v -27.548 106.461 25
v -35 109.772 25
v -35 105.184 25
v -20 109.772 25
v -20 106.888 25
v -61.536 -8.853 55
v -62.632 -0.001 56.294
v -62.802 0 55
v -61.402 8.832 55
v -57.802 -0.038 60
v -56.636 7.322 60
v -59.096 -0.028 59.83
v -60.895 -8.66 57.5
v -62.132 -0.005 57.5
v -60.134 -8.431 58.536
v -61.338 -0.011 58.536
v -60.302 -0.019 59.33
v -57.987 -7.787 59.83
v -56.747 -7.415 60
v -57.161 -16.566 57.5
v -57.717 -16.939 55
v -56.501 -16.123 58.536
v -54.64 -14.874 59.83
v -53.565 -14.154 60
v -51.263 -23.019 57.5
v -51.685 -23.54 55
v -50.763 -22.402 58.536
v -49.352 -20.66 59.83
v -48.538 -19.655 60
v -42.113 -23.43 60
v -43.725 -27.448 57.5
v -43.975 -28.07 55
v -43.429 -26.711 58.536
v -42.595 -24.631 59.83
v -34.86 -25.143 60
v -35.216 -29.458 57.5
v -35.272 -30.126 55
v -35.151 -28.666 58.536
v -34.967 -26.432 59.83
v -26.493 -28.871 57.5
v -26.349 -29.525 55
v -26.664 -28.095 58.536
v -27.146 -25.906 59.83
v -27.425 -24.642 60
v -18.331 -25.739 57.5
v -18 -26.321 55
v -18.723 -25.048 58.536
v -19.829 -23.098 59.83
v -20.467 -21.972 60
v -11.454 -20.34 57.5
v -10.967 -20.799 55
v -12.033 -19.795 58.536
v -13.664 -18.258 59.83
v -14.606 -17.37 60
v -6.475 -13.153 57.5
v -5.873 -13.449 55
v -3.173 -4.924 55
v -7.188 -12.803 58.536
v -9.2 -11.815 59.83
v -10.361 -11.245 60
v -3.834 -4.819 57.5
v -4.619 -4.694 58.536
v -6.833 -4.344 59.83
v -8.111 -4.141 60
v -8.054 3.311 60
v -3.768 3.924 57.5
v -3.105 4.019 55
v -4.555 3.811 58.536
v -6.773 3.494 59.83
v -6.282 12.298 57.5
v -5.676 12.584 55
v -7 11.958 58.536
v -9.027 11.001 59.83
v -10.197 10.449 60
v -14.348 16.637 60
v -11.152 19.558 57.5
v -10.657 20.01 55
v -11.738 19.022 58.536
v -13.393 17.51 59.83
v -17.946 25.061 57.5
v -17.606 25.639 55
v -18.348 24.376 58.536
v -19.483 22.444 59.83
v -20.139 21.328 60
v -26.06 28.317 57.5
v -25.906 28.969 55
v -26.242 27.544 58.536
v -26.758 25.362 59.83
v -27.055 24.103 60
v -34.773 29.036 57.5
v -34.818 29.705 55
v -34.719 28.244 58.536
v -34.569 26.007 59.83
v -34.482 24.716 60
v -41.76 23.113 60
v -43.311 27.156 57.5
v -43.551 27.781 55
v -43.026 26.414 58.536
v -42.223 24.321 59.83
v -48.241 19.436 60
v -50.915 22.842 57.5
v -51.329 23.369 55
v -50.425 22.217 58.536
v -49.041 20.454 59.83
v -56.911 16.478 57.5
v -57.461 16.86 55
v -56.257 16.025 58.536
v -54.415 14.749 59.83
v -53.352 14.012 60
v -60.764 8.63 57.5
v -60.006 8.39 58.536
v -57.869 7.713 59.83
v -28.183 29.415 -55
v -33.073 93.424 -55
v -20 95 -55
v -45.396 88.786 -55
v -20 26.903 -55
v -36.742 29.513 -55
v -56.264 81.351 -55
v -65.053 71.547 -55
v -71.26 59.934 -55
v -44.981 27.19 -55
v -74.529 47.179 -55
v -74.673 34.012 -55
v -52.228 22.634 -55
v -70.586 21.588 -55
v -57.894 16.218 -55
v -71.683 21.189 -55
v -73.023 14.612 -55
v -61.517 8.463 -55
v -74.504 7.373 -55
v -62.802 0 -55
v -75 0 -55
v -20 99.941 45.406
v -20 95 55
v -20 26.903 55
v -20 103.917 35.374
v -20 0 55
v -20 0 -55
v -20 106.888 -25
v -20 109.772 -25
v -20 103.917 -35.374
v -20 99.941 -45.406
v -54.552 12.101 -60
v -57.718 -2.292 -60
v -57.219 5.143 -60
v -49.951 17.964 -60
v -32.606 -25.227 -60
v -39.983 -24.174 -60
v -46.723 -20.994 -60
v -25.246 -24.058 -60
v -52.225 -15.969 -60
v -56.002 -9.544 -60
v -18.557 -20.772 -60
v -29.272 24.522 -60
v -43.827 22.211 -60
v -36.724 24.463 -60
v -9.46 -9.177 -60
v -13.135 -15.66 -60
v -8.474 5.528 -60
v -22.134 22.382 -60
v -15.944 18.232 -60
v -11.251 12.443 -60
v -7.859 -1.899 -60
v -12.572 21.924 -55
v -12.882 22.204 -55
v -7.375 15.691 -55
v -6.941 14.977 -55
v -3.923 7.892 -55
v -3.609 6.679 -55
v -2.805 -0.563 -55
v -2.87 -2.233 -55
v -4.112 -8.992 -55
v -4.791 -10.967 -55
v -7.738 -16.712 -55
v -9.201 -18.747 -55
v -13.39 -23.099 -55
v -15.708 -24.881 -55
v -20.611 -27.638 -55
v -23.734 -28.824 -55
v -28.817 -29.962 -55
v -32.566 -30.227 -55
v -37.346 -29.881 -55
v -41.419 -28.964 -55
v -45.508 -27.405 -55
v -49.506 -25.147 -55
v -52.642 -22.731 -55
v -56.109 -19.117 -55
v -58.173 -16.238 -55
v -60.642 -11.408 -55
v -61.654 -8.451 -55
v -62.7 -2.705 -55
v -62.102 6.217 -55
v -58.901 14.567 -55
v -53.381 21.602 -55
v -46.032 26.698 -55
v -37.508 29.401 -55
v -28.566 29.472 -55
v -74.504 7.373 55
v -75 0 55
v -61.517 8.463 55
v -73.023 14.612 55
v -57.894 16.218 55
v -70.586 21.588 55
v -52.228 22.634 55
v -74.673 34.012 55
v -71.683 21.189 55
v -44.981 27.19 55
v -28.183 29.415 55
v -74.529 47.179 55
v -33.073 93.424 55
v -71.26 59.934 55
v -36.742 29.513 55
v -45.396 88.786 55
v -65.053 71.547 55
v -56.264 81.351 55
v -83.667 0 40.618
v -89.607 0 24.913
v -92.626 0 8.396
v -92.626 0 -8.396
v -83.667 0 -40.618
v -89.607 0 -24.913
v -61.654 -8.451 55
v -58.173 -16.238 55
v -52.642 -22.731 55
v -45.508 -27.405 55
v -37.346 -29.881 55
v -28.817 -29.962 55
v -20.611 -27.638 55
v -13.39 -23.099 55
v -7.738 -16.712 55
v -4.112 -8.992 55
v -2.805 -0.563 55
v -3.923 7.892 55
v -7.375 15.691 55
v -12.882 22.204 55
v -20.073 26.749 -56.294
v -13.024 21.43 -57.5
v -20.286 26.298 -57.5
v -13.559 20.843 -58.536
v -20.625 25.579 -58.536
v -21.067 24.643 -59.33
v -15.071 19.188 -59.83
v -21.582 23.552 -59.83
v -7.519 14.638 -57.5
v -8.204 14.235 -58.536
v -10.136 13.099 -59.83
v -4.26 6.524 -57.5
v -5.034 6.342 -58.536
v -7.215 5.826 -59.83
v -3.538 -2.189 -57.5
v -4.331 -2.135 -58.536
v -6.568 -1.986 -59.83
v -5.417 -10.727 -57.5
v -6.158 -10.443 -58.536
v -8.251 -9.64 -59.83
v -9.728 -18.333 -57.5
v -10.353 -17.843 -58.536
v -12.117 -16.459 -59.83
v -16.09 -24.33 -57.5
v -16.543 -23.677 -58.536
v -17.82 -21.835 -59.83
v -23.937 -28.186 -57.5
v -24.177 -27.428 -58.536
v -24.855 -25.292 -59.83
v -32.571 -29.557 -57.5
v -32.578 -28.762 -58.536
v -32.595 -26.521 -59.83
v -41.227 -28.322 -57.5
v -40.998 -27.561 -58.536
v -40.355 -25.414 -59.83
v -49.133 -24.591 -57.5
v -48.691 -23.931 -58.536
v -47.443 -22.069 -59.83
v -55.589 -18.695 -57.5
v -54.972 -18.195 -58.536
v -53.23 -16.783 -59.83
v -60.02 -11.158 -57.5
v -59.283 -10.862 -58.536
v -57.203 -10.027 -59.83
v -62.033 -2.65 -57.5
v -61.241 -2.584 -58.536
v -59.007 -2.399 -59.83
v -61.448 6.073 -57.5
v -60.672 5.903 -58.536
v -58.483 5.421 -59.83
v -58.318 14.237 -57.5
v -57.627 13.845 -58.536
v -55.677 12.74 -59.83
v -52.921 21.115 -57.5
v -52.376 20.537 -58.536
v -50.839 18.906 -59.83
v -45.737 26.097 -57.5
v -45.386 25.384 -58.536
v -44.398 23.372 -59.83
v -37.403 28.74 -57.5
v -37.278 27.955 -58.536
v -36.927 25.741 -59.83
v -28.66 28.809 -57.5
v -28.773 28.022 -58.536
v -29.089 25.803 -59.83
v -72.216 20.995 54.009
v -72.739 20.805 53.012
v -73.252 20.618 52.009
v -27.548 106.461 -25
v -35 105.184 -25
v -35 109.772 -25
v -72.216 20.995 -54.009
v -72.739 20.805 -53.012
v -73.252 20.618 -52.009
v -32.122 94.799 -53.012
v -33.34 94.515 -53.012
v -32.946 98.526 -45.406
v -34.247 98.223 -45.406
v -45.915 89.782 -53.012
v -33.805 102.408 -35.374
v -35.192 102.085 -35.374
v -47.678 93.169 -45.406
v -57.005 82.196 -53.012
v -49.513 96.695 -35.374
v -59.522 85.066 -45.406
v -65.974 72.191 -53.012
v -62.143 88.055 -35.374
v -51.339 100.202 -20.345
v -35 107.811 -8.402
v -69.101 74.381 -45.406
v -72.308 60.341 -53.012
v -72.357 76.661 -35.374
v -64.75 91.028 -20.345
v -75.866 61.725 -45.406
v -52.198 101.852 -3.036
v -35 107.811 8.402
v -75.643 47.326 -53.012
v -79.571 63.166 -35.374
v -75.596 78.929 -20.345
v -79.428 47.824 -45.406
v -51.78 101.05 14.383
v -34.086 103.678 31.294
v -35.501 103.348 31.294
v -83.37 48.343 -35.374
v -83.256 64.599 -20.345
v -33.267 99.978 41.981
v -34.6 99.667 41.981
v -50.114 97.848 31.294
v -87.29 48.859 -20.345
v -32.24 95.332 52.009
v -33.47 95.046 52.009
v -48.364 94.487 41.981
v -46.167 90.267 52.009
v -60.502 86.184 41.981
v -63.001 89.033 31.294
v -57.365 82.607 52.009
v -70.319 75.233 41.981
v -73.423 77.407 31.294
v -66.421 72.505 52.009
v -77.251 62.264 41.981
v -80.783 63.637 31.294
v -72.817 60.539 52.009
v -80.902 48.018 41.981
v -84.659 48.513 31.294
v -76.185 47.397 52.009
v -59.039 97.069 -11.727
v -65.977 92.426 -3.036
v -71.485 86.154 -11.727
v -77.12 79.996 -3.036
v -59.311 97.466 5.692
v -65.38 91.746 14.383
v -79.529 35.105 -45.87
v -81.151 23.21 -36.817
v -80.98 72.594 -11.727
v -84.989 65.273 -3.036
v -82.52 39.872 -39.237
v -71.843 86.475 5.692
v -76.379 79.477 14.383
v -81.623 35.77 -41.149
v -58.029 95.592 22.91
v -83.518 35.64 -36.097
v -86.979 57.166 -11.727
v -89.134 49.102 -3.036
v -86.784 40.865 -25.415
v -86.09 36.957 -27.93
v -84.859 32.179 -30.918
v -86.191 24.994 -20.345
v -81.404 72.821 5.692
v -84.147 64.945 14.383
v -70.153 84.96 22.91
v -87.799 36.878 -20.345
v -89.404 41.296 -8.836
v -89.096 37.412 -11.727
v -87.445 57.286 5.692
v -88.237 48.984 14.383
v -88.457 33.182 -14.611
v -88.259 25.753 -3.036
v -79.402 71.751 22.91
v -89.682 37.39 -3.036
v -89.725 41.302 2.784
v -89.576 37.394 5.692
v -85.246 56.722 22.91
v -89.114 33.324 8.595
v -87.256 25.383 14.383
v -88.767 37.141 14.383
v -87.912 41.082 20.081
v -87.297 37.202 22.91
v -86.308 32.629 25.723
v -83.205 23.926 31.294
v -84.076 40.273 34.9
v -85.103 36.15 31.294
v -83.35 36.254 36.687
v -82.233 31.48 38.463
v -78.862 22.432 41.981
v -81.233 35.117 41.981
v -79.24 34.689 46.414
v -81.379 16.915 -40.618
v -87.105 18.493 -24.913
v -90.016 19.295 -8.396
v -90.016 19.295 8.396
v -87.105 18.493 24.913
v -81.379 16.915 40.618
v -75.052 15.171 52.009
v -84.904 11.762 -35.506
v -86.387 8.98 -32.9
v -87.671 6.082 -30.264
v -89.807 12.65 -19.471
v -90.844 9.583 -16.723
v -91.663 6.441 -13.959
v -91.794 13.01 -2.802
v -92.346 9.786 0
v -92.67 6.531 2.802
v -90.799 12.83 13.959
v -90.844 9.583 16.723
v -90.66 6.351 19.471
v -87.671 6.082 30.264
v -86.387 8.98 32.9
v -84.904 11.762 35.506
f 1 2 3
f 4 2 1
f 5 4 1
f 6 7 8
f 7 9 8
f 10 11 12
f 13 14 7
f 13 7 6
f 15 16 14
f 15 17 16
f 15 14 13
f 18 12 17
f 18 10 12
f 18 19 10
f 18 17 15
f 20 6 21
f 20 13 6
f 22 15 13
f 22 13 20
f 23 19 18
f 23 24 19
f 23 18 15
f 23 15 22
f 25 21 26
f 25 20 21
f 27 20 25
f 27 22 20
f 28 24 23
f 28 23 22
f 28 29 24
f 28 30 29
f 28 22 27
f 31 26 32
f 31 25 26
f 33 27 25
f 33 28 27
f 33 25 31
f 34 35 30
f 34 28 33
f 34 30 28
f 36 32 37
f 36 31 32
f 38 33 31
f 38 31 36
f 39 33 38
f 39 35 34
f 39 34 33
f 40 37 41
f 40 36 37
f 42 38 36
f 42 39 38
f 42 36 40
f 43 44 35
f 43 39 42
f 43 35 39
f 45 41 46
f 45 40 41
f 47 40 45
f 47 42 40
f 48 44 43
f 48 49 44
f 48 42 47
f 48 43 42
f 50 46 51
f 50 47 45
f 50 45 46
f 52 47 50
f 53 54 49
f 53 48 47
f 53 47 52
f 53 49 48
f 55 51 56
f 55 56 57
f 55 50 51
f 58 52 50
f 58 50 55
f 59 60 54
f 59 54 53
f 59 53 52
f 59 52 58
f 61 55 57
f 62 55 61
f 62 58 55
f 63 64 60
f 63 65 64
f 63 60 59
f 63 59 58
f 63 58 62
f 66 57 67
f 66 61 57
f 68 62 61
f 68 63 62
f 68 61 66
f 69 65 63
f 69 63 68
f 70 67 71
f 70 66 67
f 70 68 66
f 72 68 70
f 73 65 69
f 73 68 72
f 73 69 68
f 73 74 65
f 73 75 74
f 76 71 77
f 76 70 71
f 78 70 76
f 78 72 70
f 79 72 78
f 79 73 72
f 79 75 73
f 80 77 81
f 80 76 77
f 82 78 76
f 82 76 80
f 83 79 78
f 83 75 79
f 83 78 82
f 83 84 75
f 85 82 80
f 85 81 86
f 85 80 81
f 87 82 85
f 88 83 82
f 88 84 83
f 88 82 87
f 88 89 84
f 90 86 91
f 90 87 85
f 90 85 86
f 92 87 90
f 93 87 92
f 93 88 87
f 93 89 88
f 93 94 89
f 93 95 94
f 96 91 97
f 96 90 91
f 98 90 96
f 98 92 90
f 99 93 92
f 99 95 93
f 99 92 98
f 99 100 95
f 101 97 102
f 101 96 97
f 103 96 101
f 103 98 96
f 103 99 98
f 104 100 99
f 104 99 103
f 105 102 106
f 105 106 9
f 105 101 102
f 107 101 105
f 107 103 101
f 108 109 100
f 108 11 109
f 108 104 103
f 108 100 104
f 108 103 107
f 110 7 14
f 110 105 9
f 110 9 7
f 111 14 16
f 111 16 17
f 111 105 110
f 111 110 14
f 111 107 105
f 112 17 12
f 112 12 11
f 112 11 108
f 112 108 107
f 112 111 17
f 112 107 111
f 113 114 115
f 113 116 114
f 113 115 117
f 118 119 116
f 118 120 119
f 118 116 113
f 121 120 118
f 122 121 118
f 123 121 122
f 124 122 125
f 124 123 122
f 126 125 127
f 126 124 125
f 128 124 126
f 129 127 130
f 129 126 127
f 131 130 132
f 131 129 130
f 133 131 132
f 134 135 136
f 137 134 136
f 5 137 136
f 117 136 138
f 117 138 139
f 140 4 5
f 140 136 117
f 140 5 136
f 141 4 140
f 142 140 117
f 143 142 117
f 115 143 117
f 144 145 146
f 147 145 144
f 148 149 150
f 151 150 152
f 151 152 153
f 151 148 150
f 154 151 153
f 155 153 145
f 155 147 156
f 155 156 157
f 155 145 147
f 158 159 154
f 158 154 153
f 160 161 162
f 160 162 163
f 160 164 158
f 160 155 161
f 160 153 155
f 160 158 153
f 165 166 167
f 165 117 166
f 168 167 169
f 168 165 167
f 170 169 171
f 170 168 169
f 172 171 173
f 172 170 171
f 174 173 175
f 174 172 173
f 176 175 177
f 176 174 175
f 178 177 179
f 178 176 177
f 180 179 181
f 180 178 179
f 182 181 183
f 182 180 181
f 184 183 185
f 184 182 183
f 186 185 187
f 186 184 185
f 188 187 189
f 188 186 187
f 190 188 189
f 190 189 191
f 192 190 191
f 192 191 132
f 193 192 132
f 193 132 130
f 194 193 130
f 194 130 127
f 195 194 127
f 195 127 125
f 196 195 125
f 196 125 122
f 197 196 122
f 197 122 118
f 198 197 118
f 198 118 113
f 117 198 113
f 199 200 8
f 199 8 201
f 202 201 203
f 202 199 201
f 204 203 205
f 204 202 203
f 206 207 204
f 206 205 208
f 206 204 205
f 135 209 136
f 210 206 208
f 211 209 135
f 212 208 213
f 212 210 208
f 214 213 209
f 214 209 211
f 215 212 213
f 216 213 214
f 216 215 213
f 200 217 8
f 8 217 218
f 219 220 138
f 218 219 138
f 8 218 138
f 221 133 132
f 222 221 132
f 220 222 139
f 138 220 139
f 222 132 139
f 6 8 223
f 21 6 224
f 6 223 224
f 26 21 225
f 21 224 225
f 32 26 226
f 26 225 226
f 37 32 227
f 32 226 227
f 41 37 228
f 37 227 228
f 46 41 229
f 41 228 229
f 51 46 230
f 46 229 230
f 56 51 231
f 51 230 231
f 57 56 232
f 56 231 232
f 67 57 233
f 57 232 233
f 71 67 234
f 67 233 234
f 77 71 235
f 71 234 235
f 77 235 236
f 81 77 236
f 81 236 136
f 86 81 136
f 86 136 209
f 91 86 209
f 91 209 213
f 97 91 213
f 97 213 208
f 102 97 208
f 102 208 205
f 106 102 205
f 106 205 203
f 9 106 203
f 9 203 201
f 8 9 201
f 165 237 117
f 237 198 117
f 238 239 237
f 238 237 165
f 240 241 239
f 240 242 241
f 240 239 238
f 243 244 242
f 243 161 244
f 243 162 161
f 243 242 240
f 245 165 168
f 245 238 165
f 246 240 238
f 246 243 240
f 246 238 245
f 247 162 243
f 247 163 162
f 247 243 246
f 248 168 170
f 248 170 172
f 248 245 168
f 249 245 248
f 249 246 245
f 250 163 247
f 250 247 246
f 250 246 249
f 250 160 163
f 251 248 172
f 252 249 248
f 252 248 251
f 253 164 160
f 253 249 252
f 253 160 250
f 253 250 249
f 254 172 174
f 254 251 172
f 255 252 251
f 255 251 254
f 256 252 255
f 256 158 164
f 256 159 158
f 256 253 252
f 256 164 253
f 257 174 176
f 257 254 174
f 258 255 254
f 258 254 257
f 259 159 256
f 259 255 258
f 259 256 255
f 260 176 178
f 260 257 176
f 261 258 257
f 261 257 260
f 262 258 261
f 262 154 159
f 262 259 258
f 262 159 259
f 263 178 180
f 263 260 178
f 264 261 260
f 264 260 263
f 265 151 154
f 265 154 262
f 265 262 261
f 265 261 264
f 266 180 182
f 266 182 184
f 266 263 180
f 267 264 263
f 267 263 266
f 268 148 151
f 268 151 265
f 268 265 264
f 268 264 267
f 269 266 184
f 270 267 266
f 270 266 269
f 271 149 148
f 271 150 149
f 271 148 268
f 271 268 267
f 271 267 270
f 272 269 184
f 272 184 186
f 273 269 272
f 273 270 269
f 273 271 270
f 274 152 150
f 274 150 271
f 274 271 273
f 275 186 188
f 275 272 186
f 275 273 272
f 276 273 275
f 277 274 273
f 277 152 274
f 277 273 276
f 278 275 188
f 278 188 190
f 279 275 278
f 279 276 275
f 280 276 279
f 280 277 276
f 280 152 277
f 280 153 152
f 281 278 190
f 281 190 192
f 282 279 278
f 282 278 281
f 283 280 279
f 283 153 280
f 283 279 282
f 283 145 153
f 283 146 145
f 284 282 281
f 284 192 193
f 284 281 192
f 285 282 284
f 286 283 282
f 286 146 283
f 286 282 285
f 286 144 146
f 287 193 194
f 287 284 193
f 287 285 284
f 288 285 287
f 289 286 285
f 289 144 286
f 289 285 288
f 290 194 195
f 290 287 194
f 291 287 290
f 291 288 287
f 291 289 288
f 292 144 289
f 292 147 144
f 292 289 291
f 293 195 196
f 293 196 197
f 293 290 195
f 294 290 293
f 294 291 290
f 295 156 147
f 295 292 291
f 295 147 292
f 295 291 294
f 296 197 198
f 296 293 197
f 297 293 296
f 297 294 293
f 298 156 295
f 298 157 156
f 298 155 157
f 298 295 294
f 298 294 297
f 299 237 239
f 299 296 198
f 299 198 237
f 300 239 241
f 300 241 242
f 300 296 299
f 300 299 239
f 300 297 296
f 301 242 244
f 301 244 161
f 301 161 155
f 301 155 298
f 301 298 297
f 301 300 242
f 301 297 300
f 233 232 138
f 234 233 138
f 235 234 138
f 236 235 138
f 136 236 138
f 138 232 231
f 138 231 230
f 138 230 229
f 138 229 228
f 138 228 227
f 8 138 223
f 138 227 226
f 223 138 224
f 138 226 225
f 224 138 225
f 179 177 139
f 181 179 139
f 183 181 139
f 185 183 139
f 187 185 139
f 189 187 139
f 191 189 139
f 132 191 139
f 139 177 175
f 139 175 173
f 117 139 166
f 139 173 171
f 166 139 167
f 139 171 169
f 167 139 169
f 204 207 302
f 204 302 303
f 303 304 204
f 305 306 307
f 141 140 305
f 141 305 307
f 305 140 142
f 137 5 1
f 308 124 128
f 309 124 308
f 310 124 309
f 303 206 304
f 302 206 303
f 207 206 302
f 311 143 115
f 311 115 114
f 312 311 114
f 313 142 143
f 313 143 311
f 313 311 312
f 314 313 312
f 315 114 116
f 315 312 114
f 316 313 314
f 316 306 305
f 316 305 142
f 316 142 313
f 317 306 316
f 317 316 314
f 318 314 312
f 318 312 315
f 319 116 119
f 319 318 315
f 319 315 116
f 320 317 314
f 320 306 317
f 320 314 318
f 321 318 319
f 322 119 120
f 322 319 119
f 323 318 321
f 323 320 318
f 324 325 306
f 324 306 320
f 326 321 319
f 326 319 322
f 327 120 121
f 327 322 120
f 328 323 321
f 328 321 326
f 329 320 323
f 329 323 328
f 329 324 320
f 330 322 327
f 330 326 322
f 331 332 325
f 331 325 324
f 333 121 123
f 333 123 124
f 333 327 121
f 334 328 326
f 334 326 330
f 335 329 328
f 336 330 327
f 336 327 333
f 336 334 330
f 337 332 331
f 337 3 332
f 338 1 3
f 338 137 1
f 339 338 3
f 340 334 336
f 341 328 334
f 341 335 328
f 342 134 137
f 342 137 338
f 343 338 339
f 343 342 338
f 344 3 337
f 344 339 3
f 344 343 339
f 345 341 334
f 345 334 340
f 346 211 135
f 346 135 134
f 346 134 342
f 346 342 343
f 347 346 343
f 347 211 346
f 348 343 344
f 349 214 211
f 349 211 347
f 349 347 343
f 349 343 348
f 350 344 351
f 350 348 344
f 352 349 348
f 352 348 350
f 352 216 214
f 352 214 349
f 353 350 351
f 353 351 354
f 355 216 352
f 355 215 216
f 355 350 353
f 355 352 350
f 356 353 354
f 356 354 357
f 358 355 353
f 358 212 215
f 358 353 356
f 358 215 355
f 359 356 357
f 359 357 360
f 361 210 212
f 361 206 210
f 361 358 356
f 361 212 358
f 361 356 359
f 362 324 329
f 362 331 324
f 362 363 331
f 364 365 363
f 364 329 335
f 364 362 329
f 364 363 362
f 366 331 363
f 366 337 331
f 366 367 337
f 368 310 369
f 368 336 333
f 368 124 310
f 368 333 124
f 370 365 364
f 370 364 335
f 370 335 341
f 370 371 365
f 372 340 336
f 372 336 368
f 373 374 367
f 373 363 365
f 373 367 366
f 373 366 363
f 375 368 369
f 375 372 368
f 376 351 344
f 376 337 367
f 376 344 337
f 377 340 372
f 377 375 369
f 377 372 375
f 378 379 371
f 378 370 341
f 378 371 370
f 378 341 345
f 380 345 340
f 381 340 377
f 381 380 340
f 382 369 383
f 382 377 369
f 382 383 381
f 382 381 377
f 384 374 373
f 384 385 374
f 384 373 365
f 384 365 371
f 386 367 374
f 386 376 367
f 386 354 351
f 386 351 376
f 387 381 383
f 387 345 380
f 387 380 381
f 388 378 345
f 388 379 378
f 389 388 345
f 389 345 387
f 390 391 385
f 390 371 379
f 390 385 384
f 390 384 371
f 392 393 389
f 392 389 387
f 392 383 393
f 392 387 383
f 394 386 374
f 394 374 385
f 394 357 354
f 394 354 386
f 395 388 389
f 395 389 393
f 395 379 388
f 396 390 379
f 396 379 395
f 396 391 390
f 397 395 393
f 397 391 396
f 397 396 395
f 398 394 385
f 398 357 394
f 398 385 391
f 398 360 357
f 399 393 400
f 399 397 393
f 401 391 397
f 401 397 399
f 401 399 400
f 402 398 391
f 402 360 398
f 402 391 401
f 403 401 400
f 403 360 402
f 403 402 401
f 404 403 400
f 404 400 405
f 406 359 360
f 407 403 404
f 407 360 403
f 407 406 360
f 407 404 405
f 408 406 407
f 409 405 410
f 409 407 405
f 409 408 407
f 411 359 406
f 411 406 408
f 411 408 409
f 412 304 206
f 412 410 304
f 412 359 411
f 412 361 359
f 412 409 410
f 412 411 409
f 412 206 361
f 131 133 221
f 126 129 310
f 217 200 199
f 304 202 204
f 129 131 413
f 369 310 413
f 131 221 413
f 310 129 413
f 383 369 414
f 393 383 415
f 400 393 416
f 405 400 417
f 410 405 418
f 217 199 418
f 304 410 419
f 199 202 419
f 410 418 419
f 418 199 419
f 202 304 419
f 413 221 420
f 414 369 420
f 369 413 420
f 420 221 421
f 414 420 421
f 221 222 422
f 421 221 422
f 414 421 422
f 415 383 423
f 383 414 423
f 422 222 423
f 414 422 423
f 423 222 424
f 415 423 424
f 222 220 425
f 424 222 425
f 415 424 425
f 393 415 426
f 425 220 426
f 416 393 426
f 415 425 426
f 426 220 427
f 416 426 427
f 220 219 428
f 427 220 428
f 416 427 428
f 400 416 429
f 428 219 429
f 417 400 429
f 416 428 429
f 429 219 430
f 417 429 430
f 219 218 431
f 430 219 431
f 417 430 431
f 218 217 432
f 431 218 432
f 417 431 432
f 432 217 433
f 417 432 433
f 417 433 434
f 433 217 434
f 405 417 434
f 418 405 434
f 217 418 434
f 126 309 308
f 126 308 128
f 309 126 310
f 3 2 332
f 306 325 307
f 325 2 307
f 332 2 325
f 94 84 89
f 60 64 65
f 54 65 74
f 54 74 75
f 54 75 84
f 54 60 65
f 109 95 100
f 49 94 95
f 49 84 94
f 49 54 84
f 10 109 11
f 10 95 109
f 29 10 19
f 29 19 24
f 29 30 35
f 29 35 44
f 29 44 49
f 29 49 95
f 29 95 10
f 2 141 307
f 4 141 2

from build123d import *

# Parameters (mm, degrees)
OBR_T1_ANGLE                = 90
OBR_T2_ANGLE                = 110
DODANIE_WYCI_GNI_CIE1_DEPTH = 15
SZKIC5_R                    = 30
DODANIE_WYCI_GNI_CIE2_DEPTH = 5
ZAOKR_GLENIE1_R             = 5
DODANIE_WYCI_GNI_CIE3_START = 5
SZKIC6_R                    = 30
DODANIE_WYCI_GNI_CIE3_DEPTH = 5
ZAOKR_GLENIE2_R             = 5


with BuildPart() as part:
    # Szkic1 → Obrót1 (revolve)
    with BuildSketch(Plane(origin=(0, 0, 0), x_dir=(1, 0, 0), z_dir=(0, 1, 0))):
        with BuildLine():
            Line((-20, -55), (-20, 55))
            Line((-20, 55), (-75, 55))
            ThreePointArc((-75, 55), (-93.005376189, 0), (-75, -55))
            Line((-75, -55), (-20, -55))
        make_face()
    revolve(axis=Axis((-20, 0, 55), (0, 0, -1)), revolution_arc=OBR_T1_ANGLE)

    # Szkic2 → Obrót2 (revolve)
    with BuildSketch(Plane(origin=(-20, 0, 0), x_dir=(0, 0, -1), z_dir=(1, 0, 0))):
        with BuildLine():
            Line((-55, 55), (-55, 40))
            Line((-55, 40), (55, 40))
            Line((55, 40), (55, 55))
            Line((55, 55), (55, 95))
            ThreePointArc((55, 95), (0, 109.772492001), (-55, 95))
            Line((-55, 95), (-55, 55))
        make_face()
    revolve(axis=Axis((-20, 40, 55), (0, 0, 1)), revolution_arc=OBR_T2_ANGLE)

    # Szkic3 → Dodanie-wyciągnięcie1 (add)
    with BuildSketch(Plane(origin=(-20, 0, 0), x_dir=(0, 0, -1), z_dir=(1, 0, 0))):
        Polygon((0, 109.772492001), (-25, 109.772492001), (-25, 99.772492001), (25, 99.772492001), (25, 109.772492001), align=None)
    extrude(amount=-DODANIE_WYCI_GNI_CIE1_DEPTH)

    # Szkic5 → Dodanie-wyciągnięcie2 (add)
    with BuildSketch(Plane.XY.offset(55)):
        with Locations(Location((-32.802857824, -0.227507999, 0), (0, 0, 179.565487562))):
            Circle(SZKIC5_R)
    extrude(amount=DODANIE_WYCI_GNI_CIE2_DEPTH)

    # Zaokrąglenie1
    zaokr_glenie1_edges = [part.edges().sort_by_distance(p)[0] for p in [
        (-2.803720502, -0.455015999, 60),
    ]]
    fillet(zaokr_glenie1_edges, radius=ZAOKR_GLENIE1_R - 0.0001)  # a hair under: the kernel refuses the full size

    # Szkic6 → Dodanie-wyciągnięcie3 (add)
    with BuildSketch(Plane(origin=(0, 0, -55), x_dir=(-1, 0, 0), z_dir=(0, 0, -1)).offset(DODANIE_WYCI_GNI_CIE3_START)):
        with Locations(Location((32.802857824, -0.227507999, 0), (0, 0, 115.262238739))):
            Circle(SZKIC6_R)
    extrude(amount=-DODANIE_WYCI_GNI_CIE3_DEPTH)

    # Zaokrąglenie2
    zaokr_glenie2_edges = [part.edges().sort_by_distance(p)[0] for p in [
        (-45.605715649, -27.358428211, -60),
    ]]
    fillet(zaokr_glenie2_edges, radius=ZAOKR_GLENIE2_R - 0.0001)  # a hair under: the kernel refuses the full size


solid = part.part
